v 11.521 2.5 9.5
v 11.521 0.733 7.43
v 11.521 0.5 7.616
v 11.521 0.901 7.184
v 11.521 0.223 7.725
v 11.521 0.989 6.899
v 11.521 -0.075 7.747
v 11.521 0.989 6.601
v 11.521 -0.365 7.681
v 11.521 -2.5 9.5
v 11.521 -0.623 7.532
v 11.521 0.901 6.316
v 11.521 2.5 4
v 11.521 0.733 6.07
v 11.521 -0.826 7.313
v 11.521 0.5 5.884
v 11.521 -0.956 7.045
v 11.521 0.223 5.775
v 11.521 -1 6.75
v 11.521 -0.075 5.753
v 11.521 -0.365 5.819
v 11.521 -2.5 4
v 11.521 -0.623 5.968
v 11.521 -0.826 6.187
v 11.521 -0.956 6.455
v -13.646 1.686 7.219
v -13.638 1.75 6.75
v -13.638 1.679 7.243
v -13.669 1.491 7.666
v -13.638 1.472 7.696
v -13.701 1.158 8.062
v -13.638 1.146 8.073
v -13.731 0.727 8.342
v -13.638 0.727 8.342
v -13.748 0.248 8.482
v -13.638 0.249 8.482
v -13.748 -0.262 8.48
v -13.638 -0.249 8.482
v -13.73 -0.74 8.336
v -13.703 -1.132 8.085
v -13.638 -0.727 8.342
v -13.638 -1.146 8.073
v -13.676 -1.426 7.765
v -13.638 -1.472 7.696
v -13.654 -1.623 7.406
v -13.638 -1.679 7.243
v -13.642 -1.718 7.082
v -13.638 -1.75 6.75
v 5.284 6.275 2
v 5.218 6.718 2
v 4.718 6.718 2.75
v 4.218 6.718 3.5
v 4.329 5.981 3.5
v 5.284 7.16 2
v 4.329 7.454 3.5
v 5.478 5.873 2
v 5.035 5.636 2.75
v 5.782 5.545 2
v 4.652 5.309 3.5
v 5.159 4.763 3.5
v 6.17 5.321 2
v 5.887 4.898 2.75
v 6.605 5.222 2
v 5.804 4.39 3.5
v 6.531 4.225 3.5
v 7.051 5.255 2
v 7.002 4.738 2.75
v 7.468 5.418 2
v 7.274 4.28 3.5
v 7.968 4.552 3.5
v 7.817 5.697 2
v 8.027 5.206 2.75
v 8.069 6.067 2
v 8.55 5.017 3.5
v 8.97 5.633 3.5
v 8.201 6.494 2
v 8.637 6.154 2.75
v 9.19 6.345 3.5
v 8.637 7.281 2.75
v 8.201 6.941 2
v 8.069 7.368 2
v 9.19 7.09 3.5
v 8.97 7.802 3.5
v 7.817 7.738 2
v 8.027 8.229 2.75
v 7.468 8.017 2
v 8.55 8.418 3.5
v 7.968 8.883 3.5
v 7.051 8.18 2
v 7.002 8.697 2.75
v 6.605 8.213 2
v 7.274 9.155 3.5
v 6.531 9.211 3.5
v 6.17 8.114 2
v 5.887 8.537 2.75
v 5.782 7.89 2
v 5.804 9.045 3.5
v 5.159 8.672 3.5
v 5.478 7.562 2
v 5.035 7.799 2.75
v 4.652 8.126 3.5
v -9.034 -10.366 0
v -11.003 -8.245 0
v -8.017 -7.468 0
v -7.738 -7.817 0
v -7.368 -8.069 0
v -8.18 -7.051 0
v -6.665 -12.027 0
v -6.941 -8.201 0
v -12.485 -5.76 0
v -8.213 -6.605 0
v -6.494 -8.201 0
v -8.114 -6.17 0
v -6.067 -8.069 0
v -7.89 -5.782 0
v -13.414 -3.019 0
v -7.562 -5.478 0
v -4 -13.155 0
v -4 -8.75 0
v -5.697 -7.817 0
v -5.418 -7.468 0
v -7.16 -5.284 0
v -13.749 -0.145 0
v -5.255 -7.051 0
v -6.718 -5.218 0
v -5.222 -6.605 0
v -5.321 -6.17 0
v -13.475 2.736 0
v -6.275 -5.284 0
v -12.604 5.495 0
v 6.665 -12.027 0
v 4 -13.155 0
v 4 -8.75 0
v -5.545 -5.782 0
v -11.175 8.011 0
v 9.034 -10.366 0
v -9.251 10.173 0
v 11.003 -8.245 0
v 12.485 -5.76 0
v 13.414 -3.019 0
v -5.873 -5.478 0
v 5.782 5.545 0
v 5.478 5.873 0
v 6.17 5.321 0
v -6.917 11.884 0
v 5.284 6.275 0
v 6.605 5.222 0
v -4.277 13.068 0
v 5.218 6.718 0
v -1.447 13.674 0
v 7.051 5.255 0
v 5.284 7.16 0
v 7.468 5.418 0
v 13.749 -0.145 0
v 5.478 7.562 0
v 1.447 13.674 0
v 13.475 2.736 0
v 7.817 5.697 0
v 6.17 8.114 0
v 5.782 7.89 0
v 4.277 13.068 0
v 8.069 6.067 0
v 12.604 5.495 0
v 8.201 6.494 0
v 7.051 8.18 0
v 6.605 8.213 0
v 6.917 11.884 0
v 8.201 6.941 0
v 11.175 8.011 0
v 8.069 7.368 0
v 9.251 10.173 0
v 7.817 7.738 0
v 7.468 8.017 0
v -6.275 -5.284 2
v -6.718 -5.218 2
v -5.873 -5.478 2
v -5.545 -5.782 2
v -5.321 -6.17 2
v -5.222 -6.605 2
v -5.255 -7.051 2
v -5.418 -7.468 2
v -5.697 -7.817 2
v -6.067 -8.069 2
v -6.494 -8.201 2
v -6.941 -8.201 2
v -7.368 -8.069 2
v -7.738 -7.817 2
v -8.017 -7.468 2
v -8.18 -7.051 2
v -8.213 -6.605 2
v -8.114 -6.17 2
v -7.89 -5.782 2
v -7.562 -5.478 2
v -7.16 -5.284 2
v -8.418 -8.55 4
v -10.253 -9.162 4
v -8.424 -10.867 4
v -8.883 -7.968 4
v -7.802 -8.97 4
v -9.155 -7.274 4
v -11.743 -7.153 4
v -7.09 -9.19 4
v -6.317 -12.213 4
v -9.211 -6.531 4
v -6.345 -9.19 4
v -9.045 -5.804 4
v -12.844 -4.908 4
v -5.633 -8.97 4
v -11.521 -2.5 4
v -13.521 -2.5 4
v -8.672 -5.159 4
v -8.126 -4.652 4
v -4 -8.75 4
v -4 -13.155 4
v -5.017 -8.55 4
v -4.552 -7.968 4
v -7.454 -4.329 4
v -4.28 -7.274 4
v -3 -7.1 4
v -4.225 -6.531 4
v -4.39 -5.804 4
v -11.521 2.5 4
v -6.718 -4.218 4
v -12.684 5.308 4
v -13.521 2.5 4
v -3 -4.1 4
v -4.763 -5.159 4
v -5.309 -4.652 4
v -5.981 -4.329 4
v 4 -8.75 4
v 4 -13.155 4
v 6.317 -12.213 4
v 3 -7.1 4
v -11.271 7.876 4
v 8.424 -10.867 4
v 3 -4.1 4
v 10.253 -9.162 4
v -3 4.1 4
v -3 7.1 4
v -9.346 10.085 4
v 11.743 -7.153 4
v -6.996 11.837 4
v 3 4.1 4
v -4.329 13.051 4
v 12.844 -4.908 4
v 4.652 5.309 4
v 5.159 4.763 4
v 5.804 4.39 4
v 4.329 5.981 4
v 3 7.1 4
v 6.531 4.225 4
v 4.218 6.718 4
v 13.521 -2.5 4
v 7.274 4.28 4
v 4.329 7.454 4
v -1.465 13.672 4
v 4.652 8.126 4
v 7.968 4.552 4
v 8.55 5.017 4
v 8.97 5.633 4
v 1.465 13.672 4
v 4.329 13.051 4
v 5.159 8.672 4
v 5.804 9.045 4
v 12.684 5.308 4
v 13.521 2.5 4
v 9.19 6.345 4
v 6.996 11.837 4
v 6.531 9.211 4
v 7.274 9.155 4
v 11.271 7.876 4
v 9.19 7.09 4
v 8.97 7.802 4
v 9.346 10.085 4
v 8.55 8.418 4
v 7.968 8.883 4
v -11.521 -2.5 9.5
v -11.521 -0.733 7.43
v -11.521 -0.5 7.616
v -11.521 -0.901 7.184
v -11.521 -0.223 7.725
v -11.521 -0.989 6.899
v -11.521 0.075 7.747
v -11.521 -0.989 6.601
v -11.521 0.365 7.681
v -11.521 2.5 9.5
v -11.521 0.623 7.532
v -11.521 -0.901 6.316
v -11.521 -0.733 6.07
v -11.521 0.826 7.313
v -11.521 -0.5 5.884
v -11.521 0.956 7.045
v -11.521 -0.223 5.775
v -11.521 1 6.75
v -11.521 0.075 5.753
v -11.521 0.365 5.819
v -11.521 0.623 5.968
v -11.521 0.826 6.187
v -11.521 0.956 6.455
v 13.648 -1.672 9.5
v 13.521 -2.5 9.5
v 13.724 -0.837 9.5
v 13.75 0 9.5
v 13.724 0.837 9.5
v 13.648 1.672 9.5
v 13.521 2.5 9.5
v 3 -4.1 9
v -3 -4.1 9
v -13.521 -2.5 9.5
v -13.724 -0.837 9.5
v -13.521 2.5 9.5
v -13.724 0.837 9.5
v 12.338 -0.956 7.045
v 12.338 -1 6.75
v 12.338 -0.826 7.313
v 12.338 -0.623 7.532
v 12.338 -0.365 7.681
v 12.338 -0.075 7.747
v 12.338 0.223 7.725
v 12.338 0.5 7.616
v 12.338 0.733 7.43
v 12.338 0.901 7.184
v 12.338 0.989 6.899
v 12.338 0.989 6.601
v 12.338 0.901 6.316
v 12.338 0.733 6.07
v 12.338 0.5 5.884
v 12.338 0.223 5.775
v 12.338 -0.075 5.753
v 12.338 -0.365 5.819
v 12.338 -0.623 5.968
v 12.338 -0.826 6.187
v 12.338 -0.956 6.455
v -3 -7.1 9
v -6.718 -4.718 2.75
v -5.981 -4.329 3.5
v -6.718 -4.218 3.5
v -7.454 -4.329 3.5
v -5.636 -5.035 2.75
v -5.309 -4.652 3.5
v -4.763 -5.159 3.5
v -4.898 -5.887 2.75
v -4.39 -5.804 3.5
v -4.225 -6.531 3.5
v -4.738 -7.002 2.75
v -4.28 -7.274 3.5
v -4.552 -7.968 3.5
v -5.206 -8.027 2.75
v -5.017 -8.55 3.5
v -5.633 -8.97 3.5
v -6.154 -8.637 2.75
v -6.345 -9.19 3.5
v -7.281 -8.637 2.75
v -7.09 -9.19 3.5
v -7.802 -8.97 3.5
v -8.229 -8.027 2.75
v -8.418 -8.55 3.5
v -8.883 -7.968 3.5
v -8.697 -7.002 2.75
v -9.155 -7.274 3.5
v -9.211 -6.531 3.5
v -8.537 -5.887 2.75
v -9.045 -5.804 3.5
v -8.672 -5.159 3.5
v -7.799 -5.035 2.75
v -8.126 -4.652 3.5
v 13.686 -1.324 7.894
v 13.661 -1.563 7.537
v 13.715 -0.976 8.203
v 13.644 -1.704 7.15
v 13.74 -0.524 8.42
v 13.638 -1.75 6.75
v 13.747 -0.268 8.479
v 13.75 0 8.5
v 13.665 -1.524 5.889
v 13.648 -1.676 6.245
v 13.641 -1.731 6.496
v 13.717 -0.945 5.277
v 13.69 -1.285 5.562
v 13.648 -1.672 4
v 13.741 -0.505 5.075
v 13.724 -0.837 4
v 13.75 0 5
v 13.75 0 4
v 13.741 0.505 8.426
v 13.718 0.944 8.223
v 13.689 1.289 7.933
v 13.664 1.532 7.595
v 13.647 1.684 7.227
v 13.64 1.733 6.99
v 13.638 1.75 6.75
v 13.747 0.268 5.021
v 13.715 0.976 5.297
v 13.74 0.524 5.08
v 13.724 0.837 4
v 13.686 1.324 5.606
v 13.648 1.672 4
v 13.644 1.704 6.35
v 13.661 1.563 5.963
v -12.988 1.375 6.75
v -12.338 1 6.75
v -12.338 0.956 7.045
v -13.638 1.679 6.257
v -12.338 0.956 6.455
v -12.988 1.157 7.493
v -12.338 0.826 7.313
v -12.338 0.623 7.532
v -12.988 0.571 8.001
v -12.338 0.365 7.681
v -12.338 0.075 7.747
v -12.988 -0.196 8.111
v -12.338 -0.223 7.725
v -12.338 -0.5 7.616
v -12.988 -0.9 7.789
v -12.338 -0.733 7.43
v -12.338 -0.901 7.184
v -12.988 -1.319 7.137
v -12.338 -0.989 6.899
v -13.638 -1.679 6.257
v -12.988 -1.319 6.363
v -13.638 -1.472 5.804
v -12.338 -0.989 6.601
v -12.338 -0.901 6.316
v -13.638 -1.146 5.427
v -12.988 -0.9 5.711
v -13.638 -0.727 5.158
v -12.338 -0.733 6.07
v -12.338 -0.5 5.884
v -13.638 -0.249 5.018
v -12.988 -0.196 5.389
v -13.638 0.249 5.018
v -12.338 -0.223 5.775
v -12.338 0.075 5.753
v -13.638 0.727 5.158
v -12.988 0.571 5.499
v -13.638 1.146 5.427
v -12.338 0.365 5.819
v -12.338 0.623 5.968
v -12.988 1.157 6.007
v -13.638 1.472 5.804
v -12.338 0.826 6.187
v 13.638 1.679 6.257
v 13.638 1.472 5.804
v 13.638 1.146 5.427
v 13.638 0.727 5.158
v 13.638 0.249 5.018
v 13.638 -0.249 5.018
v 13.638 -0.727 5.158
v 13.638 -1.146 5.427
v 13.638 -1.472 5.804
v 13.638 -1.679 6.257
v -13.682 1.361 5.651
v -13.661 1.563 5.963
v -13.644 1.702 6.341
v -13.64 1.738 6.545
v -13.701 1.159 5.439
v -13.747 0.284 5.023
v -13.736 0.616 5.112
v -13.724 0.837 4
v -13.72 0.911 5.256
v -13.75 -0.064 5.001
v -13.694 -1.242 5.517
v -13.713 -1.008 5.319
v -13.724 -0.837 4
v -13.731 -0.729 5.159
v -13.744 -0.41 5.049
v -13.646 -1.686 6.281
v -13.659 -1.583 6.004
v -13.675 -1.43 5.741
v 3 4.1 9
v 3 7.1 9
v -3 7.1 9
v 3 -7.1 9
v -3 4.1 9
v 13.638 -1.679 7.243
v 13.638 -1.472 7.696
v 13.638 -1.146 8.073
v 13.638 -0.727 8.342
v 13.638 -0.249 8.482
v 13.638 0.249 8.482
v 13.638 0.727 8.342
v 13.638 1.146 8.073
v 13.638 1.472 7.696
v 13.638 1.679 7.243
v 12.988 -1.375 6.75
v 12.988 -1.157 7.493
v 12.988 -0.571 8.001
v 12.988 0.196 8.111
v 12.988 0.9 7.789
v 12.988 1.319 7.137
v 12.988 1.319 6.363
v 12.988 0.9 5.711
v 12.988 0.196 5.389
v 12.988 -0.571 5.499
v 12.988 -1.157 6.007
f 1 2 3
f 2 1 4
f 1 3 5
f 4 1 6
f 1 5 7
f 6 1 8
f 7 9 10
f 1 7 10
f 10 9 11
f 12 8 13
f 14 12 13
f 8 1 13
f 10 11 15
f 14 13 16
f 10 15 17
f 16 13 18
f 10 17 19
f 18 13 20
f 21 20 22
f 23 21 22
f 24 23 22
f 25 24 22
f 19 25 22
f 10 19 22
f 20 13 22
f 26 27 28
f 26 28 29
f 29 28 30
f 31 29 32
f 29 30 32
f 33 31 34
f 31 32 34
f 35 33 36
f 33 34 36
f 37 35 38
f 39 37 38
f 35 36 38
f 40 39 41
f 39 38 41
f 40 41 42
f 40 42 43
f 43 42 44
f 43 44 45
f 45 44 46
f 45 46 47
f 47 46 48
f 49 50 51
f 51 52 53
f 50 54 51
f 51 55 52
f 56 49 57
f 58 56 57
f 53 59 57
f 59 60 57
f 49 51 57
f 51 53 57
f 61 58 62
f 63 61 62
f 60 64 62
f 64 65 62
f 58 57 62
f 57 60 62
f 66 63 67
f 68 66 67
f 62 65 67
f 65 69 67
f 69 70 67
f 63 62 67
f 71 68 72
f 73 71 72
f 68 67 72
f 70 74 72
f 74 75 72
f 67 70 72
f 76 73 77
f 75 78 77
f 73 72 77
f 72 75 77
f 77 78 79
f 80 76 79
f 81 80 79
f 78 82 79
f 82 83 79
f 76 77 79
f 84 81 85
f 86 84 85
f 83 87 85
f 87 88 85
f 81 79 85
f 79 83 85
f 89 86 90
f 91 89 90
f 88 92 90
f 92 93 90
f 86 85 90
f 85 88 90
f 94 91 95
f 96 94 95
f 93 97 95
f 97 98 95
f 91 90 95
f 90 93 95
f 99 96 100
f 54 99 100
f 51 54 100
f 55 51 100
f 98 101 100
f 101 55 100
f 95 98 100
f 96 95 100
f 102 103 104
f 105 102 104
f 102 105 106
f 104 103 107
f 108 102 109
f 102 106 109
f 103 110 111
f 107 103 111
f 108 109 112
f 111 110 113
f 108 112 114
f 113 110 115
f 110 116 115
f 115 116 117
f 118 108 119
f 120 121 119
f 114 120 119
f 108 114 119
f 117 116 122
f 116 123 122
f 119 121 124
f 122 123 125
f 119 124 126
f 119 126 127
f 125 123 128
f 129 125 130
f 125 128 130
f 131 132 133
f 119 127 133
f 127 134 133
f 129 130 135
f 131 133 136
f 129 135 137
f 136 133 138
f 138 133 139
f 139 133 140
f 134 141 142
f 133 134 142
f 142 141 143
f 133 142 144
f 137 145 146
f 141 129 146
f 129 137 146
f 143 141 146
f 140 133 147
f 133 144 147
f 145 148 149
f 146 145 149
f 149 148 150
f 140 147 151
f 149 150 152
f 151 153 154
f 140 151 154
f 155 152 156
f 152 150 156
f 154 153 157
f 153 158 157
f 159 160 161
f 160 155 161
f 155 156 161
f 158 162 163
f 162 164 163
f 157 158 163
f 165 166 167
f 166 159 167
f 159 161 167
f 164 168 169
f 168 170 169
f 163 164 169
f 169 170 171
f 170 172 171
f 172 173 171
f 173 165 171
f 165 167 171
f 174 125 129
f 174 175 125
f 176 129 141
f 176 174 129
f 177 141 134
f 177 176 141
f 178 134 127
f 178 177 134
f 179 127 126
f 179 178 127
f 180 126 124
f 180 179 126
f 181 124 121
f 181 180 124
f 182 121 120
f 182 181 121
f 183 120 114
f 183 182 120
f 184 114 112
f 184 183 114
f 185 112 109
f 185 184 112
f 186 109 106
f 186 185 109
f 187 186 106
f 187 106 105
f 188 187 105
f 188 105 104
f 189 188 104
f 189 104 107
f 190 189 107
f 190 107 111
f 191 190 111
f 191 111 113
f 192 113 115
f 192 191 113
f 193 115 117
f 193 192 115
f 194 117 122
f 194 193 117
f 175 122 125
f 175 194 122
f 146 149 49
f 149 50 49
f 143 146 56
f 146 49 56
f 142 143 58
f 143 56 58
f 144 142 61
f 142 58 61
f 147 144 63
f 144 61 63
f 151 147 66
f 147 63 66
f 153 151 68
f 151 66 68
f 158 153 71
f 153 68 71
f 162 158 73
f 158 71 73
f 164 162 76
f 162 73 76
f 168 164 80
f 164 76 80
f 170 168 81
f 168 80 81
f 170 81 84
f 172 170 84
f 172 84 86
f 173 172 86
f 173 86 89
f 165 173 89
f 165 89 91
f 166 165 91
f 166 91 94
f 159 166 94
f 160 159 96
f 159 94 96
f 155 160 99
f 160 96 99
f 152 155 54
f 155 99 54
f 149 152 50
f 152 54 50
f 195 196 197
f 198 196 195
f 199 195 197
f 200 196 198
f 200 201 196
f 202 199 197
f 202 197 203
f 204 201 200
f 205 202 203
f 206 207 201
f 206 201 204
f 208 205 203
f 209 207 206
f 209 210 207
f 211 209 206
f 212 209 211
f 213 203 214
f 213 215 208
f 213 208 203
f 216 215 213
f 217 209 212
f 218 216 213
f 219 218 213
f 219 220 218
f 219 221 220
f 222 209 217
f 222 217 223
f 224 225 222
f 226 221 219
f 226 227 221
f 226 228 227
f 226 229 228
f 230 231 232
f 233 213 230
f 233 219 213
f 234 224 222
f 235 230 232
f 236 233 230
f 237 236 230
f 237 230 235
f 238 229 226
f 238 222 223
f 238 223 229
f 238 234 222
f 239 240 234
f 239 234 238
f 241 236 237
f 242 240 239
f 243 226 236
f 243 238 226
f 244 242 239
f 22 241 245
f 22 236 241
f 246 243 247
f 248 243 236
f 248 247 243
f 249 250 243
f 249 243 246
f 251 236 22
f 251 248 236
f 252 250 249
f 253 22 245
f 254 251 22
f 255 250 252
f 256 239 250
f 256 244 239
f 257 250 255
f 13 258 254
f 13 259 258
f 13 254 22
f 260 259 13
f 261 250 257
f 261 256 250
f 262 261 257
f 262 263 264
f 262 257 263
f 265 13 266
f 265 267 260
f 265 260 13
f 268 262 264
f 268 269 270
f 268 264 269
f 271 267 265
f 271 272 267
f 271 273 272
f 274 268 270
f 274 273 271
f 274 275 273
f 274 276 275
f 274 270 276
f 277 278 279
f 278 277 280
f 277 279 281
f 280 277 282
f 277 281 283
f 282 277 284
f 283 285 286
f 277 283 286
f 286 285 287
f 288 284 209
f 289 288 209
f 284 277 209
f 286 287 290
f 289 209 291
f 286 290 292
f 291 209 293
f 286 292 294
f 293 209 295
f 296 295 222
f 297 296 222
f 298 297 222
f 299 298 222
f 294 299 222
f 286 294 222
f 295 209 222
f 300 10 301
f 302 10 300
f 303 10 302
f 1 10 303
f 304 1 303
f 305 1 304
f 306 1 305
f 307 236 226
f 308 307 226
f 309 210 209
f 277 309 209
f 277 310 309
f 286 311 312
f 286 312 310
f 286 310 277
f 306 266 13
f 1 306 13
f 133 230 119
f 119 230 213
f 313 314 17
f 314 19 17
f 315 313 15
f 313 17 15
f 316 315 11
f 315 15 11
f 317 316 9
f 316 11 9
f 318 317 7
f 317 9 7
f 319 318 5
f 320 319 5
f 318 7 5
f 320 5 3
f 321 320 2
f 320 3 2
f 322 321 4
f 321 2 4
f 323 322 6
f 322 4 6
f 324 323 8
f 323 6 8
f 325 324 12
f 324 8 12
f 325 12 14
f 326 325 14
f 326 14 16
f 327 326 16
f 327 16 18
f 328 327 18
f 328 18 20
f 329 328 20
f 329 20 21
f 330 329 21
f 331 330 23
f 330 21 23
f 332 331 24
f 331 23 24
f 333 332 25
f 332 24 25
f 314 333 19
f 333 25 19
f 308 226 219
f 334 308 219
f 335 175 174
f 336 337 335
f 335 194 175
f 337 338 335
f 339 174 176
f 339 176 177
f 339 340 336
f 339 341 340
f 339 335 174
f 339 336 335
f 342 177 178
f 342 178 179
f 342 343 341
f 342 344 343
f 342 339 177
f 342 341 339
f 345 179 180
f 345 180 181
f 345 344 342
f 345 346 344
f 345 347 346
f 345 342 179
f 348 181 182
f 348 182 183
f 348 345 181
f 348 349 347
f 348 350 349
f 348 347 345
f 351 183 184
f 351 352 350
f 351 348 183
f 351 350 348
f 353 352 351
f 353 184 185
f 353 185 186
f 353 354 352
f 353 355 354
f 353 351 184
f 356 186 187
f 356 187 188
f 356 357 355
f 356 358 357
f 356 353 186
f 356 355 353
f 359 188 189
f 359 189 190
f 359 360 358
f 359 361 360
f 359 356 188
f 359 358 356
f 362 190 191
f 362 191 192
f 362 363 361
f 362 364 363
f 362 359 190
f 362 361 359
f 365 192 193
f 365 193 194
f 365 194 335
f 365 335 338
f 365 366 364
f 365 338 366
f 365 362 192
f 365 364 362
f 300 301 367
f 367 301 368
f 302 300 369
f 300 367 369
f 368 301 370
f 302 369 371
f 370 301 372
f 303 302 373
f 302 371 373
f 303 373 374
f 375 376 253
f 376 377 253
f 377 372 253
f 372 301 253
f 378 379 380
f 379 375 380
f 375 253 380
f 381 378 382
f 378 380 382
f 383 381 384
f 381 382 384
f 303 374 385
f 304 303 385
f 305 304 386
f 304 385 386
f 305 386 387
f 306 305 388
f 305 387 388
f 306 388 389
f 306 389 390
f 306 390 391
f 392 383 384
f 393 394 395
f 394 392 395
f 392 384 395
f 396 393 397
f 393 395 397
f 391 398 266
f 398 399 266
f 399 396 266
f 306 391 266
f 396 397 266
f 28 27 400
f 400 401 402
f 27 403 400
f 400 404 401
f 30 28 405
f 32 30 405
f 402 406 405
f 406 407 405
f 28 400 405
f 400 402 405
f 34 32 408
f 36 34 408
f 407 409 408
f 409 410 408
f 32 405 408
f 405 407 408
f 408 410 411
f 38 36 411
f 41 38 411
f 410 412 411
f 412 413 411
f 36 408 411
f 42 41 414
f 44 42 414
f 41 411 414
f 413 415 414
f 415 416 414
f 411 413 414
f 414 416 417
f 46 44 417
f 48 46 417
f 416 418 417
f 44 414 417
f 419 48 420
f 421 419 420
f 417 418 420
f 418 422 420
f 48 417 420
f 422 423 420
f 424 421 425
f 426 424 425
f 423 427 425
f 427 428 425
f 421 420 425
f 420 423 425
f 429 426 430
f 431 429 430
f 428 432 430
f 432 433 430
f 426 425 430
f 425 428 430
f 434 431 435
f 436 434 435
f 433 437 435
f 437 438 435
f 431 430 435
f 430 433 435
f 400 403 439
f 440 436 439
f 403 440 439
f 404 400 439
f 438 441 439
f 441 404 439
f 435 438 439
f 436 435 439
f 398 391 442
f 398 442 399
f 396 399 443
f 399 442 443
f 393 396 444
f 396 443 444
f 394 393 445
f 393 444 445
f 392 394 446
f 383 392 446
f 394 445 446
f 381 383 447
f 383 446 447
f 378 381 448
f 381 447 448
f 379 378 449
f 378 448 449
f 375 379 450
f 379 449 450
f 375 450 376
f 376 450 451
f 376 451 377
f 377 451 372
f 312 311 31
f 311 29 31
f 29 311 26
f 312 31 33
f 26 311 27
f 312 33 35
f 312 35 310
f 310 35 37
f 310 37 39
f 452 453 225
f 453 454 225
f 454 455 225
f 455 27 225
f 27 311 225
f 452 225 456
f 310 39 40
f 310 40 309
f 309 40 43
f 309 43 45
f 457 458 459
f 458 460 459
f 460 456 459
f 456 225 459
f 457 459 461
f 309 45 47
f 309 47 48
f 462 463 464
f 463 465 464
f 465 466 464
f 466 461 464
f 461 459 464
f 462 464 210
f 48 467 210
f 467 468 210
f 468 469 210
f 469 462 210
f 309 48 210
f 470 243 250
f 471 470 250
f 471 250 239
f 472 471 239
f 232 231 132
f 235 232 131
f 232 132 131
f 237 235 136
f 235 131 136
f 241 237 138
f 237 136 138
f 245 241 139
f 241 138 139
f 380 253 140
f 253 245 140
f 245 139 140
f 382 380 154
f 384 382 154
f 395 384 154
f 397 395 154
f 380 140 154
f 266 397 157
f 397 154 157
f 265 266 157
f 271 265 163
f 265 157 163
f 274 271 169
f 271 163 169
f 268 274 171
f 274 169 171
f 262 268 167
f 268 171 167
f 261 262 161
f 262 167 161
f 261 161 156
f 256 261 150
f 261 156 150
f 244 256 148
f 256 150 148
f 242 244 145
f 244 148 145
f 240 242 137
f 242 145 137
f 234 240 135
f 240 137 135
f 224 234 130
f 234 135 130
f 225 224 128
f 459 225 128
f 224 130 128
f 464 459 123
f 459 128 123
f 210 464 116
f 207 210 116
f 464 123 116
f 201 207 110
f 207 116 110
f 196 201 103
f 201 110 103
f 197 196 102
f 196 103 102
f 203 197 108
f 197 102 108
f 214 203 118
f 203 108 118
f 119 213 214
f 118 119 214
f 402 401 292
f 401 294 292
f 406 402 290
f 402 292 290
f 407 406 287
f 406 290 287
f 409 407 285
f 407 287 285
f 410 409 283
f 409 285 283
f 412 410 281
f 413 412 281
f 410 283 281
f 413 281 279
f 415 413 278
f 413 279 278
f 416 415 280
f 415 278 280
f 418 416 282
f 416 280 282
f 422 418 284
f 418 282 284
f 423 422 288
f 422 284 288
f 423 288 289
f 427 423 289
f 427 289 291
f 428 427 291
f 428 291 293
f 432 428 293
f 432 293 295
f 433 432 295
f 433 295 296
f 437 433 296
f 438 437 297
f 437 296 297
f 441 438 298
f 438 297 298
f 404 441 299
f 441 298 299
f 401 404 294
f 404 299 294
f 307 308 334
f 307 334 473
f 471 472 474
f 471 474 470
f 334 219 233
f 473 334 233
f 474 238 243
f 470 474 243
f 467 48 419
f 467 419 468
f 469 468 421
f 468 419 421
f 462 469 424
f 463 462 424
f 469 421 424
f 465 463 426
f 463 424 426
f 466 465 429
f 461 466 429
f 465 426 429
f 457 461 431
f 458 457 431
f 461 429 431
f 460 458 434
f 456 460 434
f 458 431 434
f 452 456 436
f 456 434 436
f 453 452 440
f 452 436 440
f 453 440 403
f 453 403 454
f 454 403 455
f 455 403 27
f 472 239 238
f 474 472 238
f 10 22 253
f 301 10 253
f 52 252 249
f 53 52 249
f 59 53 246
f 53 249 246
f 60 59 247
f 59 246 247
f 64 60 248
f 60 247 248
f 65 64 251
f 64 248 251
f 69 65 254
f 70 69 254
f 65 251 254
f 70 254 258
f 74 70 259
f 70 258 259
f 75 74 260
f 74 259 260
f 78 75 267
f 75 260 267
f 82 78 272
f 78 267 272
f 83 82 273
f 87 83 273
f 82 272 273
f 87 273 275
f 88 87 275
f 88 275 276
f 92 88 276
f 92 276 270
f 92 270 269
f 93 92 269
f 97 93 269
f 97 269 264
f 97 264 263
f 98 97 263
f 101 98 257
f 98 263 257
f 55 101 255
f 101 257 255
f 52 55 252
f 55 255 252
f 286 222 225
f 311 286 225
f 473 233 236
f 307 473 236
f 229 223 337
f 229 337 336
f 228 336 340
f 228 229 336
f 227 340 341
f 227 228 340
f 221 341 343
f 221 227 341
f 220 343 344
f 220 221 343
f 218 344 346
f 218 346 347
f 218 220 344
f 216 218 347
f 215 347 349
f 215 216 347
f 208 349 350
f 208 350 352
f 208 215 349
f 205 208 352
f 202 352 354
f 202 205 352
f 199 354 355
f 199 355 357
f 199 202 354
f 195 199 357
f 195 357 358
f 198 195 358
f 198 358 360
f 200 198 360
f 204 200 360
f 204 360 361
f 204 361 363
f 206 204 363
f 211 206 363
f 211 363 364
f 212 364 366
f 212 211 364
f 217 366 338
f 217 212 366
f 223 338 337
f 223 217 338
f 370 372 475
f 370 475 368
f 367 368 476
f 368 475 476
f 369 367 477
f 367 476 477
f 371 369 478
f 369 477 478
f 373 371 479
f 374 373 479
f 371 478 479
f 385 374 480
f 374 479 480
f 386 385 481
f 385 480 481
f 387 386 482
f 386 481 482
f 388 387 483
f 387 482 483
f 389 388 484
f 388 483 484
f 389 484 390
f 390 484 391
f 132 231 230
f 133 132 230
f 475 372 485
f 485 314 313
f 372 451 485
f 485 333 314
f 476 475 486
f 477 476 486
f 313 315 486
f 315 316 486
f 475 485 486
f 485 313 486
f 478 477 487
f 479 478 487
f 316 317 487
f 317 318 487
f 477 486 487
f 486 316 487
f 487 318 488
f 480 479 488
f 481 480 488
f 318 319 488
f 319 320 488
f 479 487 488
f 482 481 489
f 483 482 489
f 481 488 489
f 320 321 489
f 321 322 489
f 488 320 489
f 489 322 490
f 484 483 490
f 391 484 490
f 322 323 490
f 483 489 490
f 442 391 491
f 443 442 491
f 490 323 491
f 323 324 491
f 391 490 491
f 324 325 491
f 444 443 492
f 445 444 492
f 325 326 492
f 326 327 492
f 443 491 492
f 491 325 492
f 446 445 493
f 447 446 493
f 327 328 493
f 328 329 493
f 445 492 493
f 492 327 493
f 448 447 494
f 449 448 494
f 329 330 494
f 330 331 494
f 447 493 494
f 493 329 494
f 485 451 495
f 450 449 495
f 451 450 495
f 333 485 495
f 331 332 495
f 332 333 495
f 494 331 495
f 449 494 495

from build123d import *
from build123d.topology import SkipClean

# Parameters (mm, degrees)
SKETCH1_R           = 13.75
BOSS_EXTRUDE1_DEPTH = 4
BOSS_EXTRUDE2_DEPTH = 5.5
CIRPATTERN1_COUNT   = 2
CIRPATTERN1_ANGLE   = 180
CUT_EXTRUDE3_DEPTH  = 21.208290541
SKETCH12_W          = 6
SKETCH12_H          = 3
BOSS_EXTRUDE4_DEPTH = 5


with BuildPart() as part:
    # Sketch1 → Boss-Extrude1 (new body)
    with BuildSketch(Plane.XY):
        Circle(SKETCH1_R)
    extrude(amount=BOSS_EXTRUDE1_DEPTH)

    # Sketch2 → Boss-Extrude2 (add)
    with BuildSketch(Plane.XY.offset(4)):
        with BuildLine():
            Line((-11.520817283, 2.5), (-13.520817283, 2.5))
            ThreePointArc((-13.520817283, 2.5), (-13.75, 0), (-13.520817283, -2.5))
            Line((-13.520817283, -2.5), (-11.520817283, -2.5))
            Line((-11.520817283, -2.5), (-11.520817283, 2.5))
        make_face()
        with BuildLine():
            Line((11.520817283, -2.5), (13.520817283, -2.5))
            ThreePointArc((13.520817283, -2.5), (13.75, 0), (13.520817283, 2.5))
            Line((13.520817283, 2.5), (11.520817283, 2.5))
            Line((11.520817283, 2.5), (11.520817283, -2.5))
        make_face()
    extrude(amount=BOSS_EXTRUDE2_DEPTH)

    # Sketch6 → Cut-Revolve2 (revolve, cut)
    with BuildSketch(Plane.XY.offset(6.75)):
        Polygon((-12.338181697, 1), (-13.638181697, 1.75), (-15.174729208, 1.75), (-15.174729208, 0), (-11.520817283, 0), (-11.520817283, 1), align=None)
    cut_revolve2 = revolve(axis=Axis((-11.520817283, 0, 6.75), (-1, 0, 0)), mode=Mode.SUBTRACT)

    # CirPattern1: Cut-Revolve2 ×2 about axis
    with SkipClean():  # the faces are left unmerged after this step: merging them gives an invalid solid
        cirpattern1_axis = Axis((0, 0, 0), (0, 0, -1))
        for i in range(1, CIRPATTERN1_COUNT):
            add(cut_revolve2.rotate(cirpattern1_axis, i * CIRPATTERN1_ANGLE / (CIRPATTERN1_COUNT - 1)), mode=Mode.SUBTRACT)

    # Sketch10 → Cut-Revolve3 (revolve, cut)
    with SkipClean():  # the faces are left unmerged after this step: merging them gives an invalid solid
        with BuildSketch(Plane(origin=(0, 0, 0), x_dir=(-0.7071067811865561, -0.7071067811865389, 0), z_dir=(-0.7071067811865389, 0.7071067811865561, 0))):
            Polygon((-9.5, 0), (-8, 0), (-8, 2), (-7, 3.5), (-7, 4.049822385), (-9.5, 4.049822385), align=None)
        cut_revolve3 = revolve(axis=Axis((6.717514421, 6.717514421, 0), (0, 0, 1)), mode=Mode.SUBTRACT)

    # Mirror1: Cut-Revolve3 across plane
    with SkipClean():  # the faces are left unmerged after this step: merging them gives an invalid solid
        add(cut_revolve3.mirror(Plane(origin=(0, 0, 0), x_dir=(0, 0, 1), z_dir=(-0.7071067811865561, -0.7071067811865389, 0))), mode=Mode.SUBTRACT)

    # Sketch11 → Cut-Extrude3 (cut, through all)
    with SkipClean():  # the faces are left unmerged after this step: merging them gives an invalid solid
        with BuildSketch(Plane.XY.offset(4)):
            with BuildLine():
                ThreePointArc((-4, -13.155322117), (-2.021981816, -13.600517988), (-8e-09, -13.75))
                ThreePointArc((-8e-09, -13.75), (2.021981807, -13.600517989), (4, -13.155322117))
                Line((4, -13.155322117), (4, -8.75))
                Line((4, -8.75), (-4, -8.75))
                Line((-4, -8.75), (-4, -13.155322117))
            make_face()
        extrude(amount=-CUT_EXTRUDE3_DEPTH, mode=Mode.SUBTRACT)

    # Sketch12 → Boss-Extrude4 (add)
    with SkipClean():  # the faces are left unmerged after this step: merging them gives an invalid solid
        with BuildSketch(Plane.XY.offset(4)):
            with Locations((0, 5.6)):
                Rectangle(SKETCH12_W, SKETCH12_H)
            with Locations((0, -5.6)):
                Rectangle(SKETCH12_W, SKETCH12_H)
        extrude(amount=BOSS_EXTRUDE4_DEPTH)


solid = part.part
